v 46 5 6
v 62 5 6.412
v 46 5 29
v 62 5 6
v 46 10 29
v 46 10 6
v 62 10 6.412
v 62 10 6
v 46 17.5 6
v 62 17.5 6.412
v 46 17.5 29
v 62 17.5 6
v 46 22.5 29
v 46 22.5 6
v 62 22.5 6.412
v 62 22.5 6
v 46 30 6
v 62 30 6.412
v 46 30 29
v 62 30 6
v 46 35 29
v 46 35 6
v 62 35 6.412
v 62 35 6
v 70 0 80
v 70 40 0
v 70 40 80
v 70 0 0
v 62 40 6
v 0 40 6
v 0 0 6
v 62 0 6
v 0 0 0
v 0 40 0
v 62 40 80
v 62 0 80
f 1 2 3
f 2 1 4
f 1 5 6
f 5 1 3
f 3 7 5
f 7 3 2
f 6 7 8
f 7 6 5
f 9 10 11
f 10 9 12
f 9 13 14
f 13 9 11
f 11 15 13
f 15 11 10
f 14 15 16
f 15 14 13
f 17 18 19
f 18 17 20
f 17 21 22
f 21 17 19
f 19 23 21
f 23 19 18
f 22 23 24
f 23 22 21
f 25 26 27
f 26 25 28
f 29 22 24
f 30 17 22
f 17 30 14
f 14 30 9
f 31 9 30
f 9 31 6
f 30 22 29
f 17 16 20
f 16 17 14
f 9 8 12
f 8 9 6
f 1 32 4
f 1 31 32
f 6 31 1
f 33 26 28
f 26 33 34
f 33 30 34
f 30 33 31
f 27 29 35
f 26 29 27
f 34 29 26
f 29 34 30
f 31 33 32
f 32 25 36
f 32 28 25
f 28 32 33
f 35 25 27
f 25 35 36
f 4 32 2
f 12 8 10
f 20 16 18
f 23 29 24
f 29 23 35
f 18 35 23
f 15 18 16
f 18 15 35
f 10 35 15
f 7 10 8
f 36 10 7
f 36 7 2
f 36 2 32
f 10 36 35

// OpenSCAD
$fn = 32;

// ----------------------------------------------------------------------
// Rib bracket: 3-gusset L bracket
// ----------------------------------------------------------------------

// --- parameters (mm) ---
base_l = 70;              // foot length, X
base_w = 40;              // foot width, Y
base_t = 6;               // foot thickness
plate_t = 8;              // upright plate thickness
plate_h = 80;             // overall height
gus_l = 16;               // gusset leg along the foot
gus_h = 24;               // gusset height
gus_t = 5;                // gusset thickness
gus_edge = 5;             // gusset margin from the foot edge
n_gus = 3;                // gusset count

gus_pitch = (base_w - 2 * gus_edge - gus_t) / (n_gus - 1);  // gusset pitch

union() {
  cube([base_l, base_w, base_t]);
  translate([base_l - plate_t, 0, base_t - 1])
    cube([plate_t, base_w, plate_h - base_t + 1]);
  for (i = [0 : n_gus - 1])
    translate([base_l - plate_t - gus_l, gus_edge + i * gus_pitch, base_t - 1])
      rotate([-90, 0, 0])
        linear_extrude(height = gus_t)
          polygon(points = [[0, 0], [gus_l + 1, 0], [0, -gus_h]]);
}
